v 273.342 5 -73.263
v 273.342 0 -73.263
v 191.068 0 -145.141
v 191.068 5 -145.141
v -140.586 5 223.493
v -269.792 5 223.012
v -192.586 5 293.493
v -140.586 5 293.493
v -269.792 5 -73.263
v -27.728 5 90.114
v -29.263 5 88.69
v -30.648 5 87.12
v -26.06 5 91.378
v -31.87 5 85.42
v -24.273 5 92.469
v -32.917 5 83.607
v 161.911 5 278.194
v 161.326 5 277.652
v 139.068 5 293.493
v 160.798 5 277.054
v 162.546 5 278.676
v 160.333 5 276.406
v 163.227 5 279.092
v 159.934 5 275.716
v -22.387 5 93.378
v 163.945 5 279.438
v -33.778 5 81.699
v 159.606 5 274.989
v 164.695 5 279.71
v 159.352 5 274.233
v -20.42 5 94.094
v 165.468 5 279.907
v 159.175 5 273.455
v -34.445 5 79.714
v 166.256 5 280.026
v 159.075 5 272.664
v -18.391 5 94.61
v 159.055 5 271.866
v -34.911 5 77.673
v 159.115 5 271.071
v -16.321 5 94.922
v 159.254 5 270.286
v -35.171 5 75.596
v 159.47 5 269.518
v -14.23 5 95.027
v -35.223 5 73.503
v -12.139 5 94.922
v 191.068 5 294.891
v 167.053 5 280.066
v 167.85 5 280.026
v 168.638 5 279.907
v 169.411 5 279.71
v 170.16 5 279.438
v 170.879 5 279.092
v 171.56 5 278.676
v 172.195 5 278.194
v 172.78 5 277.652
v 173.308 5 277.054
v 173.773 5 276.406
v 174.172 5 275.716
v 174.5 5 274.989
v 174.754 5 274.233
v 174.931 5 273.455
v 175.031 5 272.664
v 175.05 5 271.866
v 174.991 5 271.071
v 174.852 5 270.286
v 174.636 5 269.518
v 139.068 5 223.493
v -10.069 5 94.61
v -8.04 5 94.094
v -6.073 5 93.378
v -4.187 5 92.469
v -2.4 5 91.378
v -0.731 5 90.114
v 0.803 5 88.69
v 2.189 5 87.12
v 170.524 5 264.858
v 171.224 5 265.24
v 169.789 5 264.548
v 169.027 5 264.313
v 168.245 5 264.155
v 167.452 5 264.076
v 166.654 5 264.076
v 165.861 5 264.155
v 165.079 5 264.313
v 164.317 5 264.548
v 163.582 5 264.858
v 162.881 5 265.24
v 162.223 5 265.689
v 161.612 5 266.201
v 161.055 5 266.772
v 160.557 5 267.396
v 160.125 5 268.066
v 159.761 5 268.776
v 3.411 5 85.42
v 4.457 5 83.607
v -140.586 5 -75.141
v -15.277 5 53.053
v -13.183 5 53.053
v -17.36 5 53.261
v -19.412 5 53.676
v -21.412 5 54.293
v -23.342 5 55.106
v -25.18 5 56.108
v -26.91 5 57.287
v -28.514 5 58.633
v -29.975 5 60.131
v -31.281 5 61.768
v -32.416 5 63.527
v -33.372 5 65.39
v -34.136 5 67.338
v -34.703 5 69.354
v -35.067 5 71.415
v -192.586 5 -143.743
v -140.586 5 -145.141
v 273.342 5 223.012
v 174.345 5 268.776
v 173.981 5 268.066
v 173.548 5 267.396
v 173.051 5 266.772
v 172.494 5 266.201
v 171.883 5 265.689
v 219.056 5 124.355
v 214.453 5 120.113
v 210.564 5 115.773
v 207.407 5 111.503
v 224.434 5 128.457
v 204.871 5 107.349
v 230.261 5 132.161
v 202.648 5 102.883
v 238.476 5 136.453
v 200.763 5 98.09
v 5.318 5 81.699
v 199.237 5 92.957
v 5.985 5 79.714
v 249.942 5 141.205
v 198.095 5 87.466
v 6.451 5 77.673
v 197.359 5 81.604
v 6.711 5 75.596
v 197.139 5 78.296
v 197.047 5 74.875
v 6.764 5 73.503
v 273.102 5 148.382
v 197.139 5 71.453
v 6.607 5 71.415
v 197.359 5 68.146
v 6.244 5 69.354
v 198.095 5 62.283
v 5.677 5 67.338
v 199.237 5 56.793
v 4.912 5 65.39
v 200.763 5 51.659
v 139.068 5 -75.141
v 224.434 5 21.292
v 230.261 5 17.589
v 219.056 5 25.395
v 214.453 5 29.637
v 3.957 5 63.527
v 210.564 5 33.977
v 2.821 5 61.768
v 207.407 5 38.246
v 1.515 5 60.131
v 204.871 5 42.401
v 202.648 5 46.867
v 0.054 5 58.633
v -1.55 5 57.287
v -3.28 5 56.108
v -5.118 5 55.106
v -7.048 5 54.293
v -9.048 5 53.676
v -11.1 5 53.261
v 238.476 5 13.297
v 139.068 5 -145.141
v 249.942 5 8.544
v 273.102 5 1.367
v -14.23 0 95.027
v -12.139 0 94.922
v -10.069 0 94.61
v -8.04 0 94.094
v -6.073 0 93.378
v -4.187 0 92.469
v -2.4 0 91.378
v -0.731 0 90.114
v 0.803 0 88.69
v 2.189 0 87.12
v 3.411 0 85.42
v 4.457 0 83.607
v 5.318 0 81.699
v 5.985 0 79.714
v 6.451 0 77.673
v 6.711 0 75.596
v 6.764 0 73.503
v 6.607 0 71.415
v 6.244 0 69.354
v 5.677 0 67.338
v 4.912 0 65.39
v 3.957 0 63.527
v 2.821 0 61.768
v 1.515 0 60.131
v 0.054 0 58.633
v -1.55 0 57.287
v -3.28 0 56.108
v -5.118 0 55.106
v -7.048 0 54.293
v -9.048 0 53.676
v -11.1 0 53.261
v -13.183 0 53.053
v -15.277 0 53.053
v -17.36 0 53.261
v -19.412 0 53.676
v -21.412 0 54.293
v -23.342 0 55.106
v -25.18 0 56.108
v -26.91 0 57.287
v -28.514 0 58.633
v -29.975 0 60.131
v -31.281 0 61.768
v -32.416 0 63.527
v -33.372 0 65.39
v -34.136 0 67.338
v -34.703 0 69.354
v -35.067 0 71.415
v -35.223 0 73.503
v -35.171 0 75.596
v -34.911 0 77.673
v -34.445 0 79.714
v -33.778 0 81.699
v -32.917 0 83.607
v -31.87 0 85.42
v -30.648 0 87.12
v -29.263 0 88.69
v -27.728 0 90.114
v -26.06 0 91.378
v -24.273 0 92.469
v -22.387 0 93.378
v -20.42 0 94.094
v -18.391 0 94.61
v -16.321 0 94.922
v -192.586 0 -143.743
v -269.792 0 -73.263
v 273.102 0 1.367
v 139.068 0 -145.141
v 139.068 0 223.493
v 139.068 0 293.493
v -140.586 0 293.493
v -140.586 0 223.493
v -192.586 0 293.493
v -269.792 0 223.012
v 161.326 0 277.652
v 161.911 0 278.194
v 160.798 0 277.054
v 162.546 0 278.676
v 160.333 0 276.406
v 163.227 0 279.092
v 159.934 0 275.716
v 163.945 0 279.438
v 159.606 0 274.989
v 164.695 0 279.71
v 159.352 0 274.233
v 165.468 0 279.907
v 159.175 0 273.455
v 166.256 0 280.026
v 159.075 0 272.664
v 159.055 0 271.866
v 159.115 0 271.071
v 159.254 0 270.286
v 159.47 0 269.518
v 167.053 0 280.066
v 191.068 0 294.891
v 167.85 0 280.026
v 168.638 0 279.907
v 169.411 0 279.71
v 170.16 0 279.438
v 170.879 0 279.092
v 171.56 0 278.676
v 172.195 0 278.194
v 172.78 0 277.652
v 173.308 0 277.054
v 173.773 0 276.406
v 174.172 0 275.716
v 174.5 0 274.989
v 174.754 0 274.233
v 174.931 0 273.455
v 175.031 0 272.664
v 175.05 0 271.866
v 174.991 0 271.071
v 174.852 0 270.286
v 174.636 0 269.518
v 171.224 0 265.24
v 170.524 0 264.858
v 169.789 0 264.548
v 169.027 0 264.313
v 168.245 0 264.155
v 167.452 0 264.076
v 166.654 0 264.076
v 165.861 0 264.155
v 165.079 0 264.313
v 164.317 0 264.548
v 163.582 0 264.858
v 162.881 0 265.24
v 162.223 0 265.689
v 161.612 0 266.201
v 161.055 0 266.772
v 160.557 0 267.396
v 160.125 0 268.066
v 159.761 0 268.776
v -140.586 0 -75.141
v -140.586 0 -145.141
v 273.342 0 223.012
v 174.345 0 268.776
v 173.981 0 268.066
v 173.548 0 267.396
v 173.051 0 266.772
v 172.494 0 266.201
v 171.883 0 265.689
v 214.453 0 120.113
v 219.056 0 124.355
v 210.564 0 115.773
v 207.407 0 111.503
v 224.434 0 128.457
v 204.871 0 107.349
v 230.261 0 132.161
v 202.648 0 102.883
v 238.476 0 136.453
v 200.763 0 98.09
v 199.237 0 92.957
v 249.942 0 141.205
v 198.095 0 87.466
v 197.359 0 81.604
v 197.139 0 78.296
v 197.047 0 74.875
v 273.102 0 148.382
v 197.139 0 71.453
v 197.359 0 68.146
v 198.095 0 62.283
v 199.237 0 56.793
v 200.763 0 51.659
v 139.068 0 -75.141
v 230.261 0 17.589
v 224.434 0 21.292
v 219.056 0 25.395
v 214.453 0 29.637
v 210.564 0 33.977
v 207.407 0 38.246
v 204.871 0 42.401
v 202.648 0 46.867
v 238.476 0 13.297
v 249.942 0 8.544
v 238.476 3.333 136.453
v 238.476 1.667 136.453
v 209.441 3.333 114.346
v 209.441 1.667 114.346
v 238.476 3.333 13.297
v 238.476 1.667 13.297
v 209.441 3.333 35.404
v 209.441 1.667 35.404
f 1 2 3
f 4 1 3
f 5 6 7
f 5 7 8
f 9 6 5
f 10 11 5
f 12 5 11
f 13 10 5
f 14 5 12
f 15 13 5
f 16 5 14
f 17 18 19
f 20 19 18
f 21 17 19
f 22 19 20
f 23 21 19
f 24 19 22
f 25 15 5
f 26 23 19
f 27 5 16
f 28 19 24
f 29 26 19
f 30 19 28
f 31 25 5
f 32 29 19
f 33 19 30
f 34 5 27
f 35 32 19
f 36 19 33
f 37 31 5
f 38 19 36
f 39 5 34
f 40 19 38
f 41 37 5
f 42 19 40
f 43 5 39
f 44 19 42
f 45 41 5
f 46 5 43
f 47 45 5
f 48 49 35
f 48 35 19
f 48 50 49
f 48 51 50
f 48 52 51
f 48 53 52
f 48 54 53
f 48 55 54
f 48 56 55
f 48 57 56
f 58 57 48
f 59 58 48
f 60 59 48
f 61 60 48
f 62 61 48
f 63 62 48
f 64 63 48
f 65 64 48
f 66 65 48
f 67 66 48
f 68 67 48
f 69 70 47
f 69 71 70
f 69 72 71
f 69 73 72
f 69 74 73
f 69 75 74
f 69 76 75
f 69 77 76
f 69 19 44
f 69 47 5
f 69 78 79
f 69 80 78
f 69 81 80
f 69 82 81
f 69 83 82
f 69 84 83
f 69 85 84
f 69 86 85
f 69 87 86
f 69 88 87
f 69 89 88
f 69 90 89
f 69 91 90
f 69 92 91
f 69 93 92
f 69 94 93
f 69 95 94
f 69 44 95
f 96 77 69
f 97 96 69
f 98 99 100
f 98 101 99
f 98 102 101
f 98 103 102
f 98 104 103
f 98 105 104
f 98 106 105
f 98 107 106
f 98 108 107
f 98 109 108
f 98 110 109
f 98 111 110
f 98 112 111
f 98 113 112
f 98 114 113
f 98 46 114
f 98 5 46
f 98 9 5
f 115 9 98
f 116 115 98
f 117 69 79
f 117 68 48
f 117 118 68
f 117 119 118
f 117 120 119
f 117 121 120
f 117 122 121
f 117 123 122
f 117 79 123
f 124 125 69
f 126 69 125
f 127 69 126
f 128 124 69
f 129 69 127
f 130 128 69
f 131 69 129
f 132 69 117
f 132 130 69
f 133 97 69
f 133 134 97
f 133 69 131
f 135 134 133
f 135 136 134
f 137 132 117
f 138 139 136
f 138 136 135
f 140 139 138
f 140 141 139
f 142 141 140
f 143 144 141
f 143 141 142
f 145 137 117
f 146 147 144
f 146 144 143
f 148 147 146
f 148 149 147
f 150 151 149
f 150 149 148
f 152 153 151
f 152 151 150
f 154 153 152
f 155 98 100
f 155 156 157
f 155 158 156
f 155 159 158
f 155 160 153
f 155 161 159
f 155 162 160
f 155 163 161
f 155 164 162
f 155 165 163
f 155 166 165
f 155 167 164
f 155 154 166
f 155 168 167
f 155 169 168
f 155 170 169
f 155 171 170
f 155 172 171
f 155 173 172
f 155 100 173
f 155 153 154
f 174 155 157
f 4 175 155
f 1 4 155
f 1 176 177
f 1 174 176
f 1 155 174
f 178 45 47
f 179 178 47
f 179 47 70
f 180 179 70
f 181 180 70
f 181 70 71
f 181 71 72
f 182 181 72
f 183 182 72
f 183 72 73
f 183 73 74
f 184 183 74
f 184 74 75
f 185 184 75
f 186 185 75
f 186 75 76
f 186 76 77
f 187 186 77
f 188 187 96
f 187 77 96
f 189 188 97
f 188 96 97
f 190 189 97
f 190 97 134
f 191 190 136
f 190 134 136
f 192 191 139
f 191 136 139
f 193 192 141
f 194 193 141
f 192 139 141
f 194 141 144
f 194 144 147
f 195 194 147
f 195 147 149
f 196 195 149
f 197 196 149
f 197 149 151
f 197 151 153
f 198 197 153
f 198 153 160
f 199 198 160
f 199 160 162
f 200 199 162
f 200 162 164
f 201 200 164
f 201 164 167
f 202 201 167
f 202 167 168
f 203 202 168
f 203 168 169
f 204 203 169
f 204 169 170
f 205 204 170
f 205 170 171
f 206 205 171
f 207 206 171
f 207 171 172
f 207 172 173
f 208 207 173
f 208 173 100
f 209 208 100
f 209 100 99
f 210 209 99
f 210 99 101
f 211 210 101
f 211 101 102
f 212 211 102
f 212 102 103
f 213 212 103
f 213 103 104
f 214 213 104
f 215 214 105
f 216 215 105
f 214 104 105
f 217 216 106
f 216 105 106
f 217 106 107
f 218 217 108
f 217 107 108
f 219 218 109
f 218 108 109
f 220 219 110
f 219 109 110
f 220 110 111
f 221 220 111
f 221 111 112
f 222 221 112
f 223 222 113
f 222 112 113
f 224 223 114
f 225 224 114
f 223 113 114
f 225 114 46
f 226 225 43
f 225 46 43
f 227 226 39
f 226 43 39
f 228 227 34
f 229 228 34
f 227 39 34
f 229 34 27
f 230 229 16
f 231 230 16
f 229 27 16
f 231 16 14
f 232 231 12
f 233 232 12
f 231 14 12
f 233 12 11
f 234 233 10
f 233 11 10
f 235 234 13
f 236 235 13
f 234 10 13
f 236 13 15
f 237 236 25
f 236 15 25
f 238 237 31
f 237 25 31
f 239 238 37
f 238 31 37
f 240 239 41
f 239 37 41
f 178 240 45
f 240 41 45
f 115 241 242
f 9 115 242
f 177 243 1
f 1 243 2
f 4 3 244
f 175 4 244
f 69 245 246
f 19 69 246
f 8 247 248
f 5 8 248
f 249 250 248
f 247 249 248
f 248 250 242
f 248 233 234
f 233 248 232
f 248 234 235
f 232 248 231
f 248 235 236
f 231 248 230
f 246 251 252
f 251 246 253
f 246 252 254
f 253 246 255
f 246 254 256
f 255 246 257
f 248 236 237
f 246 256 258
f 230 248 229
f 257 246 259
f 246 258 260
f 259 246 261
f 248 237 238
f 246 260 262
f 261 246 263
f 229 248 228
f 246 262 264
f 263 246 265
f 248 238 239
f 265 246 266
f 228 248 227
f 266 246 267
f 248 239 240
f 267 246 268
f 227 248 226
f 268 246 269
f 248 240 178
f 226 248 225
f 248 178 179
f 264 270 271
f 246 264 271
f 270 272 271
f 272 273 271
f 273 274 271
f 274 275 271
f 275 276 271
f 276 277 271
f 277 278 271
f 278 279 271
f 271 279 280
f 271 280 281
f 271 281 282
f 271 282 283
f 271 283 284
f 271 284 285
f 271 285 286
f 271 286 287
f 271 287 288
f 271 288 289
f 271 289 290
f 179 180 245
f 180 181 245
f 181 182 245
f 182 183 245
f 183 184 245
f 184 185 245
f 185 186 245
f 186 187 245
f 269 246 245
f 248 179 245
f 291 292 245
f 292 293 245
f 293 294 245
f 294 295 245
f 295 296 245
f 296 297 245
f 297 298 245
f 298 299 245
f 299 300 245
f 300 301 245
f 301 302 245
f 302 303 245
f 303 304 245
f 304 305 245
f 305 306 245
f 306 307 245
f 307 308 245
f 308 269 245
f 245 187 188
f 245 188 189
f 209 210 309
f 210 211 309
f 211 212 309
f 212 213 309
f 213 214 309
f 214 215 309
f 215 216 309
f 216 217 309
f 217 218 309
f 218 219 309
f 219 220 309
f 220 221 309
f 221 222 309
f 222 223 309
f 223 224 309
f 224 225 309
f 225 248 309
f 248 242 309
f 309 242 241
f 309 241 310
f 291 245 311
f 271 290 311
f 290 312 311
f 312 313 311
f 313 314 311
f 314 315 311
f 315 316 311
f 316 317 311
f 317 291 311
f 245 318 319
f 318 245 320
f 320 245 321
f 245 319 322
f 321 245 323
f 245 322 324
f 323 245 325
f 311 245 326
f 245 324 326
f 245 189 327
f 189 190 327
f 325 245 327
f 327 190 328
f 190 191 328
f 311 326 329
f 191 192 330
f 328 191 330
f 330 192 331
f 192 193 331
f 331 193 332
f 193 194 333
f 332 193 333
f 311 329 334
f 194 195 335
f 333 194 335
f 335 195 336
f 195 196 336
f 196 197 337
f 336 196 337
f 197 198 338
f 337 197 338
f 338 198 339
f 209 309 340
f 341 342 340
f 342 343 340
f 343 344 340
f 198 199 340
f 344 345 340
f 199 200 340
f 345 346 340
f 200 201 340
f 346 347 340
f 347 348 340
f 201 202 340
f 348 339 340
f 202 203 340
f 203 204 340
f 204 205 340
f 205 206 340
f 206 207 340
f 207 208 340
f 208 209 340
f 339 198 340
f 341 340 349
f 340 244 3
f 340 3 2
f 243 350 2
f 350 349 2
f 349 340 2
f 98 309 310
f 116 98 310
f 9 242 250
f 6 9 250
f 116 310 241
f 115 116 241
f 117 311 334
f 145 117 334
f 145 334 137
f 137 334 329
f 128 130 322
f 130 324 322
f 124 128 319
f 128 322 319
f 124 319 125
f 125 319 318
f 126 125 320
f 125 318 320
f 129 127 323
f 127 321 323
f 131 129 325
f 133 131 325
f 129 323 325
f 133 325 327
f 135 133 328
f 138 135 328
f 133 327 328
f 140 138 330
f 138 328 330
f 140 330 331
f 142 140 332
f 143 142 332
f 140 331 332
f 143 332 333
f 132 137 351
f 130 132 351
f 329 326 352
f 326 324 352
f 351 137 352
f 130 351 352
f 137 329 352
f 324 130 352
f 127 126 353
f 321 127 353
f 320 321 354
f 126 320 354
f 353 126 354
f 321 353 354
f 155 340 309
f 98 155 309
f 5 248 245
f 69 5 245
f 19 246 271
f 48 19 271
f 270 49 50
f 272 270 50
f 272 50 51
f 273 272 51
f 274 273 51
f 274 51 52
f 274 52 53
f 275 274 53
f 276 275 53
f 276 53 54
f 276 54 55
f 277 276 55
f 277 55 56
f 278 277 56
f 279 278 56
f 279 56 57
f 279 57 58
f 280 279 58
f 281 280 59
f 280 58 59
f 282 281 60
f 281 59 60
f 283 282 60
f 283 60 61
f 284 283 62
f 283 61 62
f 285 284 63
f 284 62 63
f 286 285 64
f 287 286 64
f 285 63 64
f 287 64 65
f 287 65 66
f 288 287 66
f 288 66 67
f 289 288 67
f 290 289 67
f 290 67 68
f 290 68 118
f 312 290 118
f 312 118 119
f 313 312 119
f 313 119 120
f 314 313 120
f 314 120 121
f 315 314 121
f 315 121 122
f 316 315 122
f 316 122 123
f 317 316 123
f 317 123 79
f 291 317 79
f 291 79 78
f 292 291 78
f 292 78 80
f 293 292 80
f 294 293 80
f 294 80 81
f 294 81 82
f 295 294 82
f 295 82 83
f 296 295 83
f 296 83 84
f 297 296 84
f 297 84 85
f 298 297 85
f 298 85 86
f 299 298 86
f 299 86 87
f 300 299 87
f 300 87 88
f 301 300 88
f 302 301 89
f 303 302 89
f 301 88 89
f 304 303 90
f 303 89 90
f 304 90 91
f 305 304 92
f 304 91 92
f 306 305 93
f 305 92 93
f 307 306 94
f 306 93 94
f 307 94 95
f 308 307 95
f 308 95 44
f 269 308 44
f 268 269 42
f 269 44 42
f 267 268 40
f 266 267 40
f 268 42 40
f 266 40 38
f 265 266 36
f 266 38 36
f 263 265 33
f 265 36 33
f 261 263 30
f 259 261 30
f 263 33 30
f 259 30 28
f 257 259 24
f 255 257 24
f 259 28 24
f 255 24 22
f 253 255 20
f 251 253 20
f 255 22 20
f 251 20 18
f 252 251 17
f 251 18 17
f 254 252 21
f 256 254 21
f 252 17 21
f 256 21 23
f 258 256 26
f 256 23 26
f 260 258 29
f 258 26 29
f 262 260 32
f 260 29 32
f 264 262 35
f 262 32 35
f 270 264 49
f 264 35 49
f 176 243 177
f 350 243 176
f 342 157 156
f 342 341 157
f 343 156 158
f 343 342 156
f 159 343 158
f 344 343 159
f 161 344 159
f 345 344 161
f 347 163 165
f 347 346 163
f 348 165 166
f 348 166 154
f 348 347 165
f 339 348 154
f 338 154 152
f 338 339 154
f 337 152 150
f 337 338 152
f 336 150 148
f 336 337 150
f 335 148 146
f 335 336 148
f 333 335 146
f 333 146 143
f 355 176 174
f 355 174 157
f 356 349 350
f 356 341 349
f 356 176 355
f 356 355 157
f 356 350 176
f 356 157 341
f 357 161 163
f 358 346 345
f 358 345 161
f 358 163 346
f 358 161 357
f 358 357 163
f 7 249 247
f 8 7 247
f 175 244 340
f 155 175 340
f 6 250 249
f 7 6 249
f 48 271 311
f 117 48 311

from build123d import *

# Parameters (mm, degrees)
EXTRUDE_1_DEPTH     = 5
SKETCH_2_R          = 21
CUT_EXTRUDE_1_DEPTH = 403.120979525
SKETCH1_R           = 8
CUT_EXTRUDE1_DEPTH  = 403.120979525


with BuildPart() as part:
    # Эскиз1 → Вытянуть1 (new body)
    with BuildSketch(Plane(origin=(0, 0, 0), x_dir=(1, 0, 0), z_dir=(0, 1, 0))):
        with BuildLine():
            Line((-269.7921816, 73.262575573), (-269.7921816, -223.012011978))
            Line((-269.7921816, -223.012011978), (-192.586469874, -293.492830448))
            Line((-192.586469874, -293.492830448), (-140.586469874, -293.492830448))
            Line((-140.586469874, -293.492830448), (-140.586469874, -223.492830448))
            Line((-140.586469874, -223.492830448), (139.068300868, -223.492830448))
            Line((139.068300868, -223.492830448), (139.068300868, -293.492830448))
            Line((139.068300868, -293.492830448), (191.068300868, -294.890935713))
            Line((191.068300868, -294.890935713), (273.341577689, -223.012011978))
            Line((273.341577689, -223.012011978), (273.101729514, -148.382005757))
            add(Edge.make_bspline(
                [(273.101729514, -148.382005757), (239.363891717, -139.145872689), (197.437007815, -125.423723423), (197.047353036, -74.874718203)],
                knots=[0, 0, 0, 0, 1, 1, 1, 1], degree=3))
            add(Edge.make_bspline(
                [(273.101729514, -1.367430648), (239.363891717, -10.603563716), (197.437007815, -24.325712982), (197.047353036, -74.874718203)],
                knots=[0, 0, 0, 0, 1, 1, 1, 1], degree=3))
            Line((273.101729514, -1.367430648), (273.341577689, 73.262575573))
            Line((273.341577689, 73.262575573), (191.068300868, 145.141499308))
            Line((191.068300868, 145.141499308), (139.068300868, 145.141499308))
            Line((139.068300868, 145.141499308), (139.068300868, 75.141499308))
            Line((139.068300868, 75.141499308), (-140.586469874, 75.141499308))
            Line((-140.586469874, 75.141499308), (-140.586469874, 145.141499308))
            Line((-140.586469874, 145.141499308), (-192.586469874, 143.743394043))
            Line((-192.586469874, 143.743394043), (-269.7921816, 73.262575573))
        make_face()
    extrude(amount=EXTRUDE_1_DEPTH)

    # Эскиз2 → Вырез-Вытянуть1 (cut, through all)
    with BuildSketch(Plane(origin=(0, 5, 0), x_dir=(-1, 0, 0), z_dir=(0, 1, 0))):
        with Locations(Location((14.229950912, 74.026657254, 0), (0, 0, 90))):
            Circle(SKETCH_2_R)
    extrude(amount=-CUT_EXTRUDE_1_DEPTH, mode=Mode.SUBTRACT)

    # Sketch1 → Cut-Extrude1 (cut, through all)
    with BuildSketch(Plane(origin=(0, 5, 0), x_dir=(1, 0, 0), z_dir=(0, 1, 0))):
        with Locations(Location((167.052967516, -272.065876514, 0), (0, 0, 270))):
            Circle(SKETCH1_R)
    extrude(amount=-CUT_EXTRUDE1_DEPTH, mode=Mode.SUBTRACT)


solid = part.part
